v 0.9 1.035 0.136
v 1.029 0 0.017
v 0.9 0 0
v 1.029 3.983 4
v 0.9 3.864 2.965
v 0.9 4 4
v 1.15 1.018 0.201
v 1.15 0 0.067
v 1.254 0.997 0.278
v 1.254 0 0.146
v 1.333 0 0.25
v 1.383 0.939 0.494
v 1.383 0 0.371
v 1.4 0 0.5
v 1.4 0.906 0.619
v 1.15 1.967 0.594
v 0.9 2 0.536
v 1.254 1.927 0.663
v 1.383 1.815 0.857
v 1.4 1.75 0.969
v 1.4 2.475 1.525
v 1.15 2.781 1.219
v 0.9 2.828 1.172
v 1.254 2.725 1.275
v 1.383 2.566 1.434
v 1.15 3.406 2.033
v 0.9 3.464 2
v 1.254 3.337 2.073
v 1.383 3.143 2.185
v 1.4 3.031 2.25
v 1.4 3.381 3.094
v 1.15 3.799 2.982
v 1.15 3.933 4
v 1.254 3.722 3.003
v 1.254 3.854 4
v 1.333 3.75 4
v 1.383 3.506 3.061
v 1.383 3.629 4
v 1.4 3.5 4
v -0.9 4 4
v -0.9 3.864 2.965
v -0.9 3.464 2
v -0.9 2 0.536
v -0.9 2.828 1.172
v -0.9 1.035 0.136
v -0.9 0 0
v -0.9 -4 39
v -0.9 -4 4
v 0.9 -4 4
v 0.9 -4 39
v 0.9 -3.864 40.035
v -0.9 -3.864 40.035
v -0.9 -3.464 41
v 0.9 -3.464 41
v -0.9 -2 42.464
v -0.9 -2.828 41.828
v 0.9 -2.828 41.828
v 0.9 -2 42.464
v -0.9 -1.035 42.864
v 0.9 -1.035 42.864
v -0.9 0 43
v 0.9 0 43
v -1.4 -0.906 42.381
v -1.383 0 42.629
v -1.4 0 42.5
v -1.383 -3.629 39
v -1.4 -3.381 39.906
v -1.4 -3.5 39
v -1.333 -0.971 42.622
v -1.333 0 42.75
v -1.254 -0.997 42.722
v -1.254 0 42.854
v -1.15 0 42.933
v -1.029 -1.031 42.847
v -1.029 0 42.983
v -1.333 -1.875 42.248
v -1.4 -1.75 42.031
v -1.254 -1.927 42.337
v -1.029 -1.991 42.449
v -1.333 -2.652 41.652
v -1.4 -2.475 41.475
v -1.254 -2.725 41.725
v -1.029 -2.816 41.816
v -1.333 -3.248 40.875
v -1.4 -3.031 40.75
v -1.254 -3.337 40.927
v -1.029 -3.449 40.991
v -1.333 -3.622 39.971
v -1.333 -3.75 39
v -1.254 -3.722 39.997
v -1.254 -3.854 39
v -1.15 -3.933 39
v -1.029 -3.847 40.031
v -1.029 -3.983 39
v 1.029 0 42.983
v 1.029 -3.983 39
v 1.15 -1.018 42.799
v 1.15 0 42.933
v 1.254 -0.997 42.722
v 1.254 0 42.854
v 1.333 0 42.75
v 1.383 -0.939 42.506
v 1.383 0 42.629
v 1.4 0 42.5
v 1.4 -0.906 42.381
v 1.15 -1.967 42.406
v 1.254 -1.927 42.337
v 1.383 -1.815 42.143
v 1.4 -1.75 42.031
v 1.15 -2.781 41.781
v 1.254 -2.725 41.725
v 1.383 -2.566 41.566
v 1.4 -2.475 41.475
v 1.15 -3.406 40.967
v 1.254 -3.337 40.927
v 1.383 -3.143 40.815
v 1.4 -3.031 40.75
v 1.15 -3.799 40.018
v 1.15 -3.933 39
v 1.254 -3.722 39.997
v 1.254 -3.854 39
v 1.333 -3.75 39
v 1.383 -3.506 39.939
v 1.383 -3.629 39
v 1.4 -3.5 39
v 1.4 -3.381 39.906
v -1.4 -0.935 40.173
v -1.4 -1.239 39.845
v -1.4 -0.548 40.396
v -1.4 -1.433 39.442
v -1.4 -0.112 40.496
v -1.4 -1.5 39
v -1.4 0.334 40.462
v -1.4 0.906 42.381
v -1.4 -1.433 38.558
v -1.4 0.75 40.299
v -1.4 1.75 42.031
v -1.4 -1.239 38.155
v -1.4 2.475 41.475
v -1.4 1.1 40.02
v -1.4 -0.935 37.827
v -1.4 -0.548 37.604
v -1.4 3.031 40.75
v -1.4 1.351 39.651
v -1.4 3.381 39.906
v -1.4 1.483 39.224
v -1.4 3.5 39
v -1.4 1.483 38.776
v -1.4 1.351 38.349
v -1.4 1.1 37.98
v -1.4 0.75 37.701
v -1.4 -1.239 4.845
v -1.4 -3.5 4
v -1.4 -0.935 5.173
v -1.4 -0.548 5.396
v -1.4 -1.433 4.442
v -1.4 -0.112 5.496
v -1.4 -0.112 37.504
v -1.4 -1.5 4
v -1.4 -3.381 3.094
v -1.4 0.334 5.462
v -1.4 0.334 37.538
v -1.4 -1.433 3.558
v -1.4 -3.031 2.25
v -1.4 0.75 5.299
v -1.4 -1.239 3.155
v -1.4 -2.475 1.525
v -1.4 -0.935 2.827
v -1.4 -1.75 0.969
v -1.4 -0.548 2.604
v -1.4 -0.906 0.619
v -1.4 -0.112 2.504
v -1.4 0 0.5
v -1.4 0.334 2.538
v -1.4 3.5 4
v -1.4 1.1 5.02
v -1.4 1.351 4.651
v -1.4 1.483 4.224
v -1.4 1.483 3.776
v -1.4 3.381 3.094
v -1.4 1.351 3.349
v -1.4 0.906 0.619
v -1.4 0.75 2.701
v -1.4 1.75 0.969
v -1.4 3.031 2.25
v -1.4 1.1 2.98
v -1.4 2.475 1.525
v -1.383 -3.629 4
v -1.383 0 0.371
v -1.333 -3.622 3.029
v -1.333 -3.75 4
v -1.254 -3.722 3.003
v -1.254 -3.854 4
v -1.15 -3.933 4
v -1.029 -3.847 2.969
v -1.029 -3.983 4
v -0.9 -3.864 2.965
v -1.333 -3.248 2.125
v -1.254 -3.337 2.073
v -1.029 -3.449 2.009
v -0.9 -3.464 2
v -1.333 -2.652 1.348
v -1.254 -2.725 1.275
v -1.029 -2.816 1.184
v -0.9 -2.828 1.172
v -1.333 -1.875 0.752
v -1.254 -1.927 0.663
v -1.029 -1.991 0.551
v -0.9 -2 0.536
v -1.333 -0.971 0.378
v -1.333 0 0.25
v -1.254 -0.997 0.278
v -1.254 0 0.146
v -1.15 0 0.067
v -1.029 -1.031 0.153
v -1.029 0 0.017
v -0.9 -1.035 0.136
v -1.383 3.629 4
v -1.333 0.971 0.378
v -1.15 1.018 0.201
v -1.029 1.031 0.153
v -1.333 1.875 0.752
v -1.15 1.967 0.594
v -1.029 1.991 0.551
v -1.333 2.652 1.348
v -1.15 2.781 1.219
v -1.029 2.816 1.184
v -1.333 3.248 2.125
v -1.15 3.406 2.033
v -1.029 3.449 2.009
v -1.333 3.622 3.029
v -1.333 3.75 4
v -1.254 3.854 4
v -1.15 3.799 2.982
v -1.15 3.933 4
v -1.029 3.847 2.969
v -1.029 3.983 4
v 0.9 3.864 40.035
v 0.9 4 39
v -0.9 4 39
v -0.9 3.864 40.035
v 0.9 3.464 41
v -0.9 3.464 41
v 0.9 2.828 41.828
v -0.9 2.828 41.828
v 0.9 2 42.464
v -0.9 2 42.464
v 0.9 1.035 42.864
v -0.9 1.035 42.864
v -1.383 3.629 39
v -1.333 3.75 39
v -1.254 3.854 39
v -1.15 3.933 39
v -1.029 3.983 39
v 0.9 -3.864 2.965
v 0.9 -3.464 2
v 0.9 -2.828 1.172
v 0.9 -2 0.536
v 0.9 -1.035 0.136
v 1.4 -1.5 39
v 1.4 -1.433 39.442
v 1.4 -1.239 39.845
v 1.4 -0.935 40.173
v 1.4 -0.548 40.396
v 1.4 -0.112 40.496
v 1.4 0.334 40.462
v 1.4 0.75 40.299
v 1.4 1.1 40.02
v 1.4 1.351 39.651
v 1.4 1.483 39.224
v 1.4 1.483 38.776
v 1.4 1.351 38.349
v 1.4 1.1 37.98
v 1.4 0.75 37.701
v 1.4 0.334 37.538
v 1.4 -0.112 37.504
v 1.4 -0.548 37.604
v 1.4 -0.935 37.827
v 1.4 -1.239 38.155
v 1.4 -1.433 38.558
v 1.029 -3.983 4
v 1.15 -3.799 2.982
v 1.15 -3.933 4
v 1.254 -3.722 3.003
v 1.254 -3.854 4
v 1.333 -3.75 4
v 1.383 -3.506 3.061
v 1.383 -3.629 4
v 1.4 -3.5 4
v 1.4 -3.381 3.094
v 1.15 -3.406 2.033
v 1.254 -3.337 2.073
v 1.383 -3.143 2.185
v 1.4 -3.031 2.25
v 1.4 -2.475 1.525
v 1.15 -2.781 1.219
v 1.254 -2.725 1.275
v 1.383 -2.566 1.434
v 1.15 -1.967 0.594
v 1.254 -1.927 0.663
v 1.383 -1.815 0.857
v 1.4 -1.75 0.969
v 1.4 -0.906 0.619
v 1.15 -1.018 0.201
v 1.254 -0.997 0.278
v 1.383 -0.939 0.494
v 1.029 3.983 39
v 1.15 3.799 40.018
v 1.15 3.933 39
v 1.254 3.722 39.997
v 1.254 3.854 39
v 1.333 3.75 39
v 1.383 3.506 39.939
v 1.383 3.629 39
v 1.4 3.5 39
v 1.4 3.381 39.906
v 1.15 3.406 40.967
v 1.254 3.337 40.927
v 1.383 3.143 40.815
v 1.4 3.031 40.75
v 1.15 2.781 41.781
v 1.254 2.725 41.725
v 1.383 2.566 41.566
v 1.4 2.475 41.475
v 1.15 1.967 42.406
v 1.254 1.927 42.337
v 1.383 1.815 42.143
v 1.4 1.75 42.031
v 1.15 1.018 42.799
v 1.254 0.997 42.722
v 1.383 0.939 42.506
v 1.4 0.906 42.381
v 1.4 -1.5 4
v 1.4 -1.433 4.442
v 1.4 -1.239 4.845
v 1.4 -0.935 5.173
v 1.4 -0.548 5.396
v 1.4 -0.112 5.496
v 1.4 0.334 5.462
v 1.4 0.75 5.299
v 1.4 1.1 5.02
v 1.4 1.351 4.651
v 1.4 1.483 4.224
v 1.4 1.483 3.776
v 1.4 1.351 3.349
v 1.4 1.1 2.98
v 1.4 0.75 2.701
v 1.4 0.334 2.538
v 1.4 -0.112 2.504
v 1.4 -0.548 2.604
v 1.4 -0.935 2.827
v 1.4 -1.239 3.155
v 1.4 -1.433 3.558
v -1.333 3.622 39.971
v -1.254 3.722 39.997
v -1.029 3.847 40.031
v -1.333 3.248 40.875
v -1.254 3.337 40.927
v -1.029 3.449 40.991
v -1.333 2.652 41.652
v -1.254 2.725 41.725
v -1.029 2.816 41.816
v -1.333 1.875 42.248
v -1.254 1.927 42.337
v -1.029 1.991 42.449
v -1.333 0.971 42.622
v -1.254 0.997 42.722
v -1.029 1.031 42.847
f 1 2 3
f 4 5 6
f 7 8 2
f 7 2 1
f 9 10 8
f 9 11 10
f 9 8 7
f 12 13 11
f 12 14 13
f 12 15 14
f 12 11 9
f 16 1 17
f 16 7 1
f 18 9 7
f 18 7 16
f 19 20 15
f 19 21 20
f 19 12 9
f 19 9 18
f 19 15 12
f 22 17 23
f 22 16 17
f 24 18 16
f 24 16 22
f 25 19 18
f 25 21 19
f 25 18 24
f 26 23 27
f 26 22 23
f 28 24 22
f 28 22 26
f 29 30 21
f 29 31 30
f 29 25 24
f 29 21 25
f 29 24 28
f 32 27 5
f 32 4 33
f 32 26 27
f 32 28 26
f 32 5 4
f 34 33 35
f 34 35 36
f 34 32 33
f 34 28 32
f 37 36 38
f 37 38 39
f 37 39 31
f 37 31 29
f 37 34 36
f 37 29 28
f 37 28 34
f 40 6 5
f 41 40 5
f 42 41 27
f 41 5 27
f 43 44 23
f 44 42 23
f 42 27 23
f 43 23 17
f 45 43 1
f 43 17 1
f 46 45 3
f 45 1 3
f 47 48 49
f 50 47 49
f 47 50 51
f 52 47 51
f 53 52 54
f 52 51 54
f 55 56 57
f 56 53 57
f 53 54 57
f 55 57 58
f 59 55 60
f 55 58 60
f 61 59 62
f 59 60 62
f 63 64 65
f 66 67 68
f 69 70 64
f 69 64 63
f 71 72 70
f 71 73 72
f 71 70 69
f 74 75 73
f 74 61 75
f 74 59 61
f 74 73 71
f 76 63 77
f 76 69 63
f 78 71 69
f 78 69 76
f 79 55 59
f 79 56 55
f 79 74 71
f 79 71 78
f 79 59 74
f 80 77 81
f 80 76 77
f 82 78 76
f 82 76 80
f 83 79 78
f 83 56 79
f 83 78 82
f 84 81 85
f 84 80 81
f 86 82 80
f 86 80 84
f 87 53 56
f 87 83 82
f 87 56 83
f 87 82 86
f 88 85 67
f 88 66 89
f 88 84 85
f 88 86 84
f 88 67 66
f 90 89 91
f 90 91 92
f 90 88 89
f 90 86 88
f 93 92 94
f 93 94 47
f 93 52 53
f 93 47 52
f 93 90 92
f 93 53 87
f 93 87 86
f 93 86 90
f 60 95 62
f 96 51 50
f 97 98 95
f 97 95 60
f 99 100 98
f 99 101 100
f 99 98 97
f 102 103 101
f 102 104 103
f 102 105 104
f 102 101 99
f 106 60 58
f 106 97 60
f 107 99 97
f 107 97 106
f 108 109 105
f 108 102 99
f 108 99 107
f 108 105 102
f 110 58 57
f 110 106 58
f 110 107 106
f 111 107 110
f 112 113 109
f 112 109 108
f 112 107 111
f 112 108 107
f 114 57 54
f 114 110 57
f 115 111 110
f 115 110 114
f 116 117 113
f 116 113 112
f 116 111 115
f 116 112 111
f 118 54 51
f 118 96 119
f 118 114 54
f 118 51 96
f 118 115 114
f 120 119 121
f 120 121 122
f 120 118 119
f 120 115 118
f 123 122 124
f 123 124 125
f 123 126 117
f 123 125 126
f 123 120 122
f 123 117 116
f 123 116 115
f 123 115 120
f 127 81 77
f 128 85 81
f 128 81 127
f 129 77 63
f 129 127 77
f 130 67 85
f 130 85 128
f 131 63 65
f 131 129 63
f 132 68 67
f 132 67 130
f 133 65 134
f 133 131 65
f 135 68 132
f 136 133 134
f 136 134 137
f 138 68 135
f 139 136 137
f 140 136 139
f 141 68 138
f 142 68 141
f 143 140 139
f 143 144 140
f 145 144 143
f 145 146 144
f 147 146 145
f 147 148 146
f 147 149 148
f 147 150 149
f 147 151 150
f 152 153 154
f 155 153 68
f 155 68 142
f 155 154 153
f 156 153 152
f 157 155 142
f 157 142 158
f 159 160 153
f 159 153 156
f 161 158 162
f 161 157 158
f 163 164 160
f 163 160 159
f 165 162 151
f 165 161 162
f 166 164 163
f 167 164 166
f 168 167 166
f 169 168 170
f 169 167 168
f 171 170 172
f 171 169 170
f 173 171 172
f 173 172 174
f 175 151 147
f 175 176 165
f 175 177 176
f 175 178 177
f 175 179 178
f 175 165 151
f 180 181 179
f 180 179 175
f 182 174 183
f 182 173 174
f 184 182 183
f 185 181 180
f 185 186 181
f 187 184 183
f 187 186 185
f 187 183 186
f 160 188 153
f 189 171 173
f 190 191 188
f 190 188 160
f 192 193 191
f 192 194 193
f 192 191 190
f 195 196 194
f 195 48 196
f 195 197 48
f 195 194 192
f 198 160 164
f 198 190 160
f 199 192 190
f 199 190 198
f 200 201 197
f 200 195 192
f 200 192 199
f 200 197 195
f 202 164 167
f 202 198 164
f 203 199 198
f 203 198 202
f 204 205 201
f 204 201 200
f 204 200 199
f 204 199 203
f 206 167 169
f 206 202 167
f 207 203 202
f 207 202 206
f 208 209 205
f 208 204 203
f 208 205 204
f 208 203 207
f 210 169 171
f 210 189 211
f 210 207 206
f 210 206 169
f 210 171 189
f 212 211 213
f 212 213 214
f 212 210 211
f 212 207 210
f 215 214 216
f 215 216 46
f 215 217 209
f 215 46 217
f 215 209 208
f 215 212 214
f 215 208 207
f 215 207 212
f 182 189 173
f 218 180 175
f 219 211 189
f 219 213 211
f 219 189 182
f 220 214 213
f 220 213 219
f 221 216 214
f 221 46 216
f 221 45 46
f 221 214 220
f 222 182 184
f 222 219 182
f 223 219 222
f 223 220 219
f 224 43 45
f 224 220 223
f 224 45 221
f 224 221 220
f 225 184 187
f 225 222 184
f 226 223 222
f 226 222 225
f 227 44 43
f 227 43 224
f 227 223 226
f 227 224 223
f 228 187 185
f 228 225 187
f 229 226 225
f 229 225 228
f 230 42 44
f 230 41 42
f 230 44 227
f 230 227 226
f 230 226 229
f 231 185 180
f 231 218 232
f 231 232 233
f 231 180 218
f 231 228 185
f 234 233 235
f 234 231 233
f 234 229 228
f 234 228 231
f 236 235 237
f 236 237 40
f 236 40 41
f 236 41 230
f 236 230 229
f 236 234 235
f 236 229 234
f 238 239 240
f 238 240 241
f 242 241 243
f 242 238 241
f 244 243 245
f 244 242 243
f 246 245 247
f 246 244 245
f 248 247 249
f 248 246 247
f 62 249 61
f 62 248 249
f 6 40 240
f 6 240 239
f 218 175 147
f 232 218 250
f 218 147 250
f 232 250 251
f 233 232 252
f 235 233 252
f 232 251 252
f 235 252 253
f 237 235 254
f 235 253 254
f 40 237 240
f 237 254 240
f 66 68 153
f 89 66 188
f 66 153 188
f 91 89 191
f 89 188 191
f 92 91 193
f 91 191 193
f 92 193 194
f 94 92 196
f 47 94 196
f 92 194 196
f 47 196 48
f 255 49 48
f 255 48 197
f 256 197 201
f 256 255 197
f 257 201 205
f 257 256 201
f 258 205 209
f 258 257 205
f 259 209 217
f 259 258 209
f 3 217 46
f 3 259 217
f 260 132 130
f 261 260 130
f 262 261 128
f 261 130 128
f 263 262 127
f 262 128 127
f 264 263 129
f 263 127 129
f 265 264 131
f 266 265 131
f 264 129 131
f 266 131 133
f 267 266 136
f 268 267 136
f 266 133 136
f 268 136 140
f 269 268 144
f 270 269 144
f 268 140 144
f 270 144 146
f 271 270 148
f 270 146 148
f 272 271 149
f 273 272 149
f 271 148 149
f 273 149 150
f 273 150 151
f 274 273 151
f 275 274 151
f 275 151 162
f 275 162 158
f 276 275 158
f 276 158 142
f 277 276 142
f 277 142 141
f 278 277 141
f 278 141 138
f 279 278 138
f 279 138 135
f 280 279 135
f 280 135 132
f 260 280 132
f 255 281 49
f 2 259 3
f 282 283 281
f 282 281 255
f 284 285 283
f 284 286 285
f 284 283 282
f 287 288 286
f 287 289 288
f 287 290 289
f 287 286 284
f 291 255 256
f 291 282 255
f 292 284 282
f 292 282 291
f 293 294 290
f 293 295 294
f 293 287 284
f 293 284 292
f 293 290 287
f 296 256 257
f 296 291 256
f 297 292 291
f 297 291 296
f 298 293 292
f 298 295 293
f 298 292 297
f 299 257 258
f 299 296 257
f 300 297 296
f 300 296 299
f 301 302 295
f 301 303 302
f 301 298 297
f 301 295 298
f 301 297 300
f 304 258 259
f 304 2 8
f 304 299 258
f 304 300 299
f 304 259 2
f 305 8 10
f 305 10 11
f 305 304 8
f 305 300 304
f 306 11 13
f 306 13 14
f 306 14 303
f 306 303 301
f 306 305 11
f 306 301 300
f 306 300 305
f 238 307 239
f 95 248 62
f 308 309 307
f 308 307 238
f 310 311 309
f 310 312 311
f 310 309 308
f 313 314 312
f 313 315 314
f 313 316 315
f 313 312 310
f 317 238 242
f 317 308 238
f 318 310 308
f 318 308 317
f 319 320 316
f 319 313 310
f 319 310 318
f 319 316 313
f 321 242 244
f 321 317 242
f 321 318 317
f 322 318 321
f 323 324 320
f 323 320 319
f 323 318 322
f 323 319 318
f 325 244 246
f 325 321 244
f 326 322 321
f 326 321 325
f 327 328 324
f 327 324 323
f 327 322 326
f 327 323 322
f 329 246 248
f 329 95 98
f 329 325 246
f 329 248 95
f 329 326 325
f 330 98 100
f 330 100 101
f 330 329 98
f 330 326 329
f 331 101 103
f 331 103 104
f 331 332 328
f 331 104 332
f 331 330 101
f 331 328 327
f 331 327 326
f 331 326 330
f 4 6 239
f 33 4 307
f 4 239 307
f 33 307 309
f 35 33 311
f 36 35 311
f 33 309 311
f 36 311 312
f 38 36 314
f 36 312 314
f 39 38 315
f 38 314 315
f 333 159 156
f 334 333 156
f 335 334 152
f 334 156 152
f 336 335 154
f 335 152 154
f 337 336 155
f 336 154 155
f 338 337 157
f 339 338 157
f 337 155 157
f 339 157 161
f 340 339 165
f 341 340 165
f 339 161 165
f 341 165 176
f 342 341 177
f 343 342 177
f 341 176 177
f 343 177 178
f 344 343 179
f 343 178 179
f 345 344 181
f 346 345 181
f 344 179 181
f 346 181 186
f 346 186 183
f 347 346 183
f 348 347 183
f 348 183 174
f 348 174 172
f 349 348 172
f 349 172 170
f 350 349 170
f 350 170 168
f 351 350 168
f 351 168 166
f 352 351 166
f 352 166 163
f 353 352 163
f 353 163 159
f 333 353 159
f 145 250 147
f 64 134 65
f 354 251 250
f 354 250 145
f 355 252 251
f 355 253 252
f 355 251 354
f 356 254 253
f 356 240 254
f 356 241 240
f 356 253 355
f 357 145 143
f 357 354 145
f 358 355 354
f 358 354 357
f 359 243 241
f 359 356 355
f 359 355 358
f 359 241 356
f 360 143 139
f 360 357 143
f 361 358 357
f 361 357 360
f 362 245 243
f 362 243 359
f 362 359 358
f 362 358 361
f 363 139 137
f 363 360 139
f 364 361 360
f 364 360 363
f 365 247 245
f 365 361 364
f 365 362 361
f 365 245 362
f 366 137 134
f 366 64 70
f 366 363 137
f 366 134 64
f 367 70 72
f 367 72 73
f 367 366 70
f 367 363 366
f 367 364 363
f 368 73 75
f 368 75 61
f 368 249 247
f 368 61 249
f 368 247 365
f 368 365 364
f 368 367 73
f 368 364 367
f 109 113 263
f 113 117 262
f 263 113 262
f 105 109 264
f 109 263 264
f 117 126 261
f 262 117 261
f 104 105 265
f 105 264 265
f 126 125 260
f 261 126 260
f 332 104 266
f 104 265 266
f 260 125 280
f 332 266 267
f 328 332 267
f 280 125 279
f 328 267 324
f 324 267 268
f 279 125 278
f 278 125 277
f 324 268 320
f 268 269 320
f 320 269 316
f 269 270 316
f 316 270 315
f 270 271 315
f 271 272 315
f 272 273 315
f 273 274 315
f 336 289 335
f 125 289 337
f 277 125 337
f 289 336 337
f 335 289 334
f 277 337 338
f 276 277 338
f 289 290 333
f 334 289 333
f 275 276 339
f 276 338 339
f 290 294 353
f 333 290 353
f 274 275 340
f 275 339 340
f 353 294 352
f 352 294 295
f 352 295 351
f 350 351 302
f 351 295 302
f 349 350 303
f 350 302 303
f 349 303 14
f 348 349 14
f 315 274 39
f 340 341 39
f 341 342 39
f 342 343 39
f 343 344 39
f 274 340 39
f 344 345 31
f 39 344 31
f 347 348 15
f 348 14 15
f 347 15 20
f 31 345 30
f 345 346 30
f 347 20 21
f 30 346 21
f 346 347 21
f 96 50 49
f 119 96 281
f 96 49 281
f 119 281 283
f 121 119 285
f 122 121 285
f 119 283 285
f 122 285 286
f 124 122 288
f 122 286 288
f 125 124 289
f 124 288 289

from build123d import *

# Parameters (mm, degrees)
F0_W     = 2.8
F0_H     = 8
F1_DEPTH = 43
F2_R     = 3.99999
F3_R     = 1.5
F4_DEPTH = 5
F5_R     = 0.5


# Not quite as in the source:
# - a fillet or chamfer is up to 0.001 mm smaller than in the source, because OpenCascade refuses the exact size


with BuildPart() as f1:
    # F0 (on Top) → F1 (new body)
    with BuildSketch(Plane.XY):
        Rectangle(F0_W, F0_H)
    extrude(amount=F1_DEPTH)

    # F2 (radius 4 in the source; OpenCascade refuses exactly that, so slightly less here)
    f2_edges = [f1.edges().sort_by_distance(p)[0] for p in [
        (0, 4, 0),
        (0, -4, 0),
        (0, -4, 43),
        (0, 4, 43),
    ]]
    fillet(f2_edges, radius=F2_R)

    # F3 (on face) → F4 (cut)
    with BuildSketch(Plane(origin=(-1.4, 0, 0), x_dir=(0, -1, 0), z_dir=(-1, 0, 0))):
        with Locations((0, 4)):
            Circle(F3_R)
        with Locations((0, 39)):
            Circle(F3_R)
    extrude(amount=-F4_DEPTH, mode=Mode.SUBTRACT)

    # F5
    f5_edges = [f1.edges().sort_by_distance(p)[0] for p in [
        (-1.4, 4, 21.5),
        (1.4, 4, 21.5),
    ]]
    fillet(f5_edges, radius=F5_R)


solid = f1.part
